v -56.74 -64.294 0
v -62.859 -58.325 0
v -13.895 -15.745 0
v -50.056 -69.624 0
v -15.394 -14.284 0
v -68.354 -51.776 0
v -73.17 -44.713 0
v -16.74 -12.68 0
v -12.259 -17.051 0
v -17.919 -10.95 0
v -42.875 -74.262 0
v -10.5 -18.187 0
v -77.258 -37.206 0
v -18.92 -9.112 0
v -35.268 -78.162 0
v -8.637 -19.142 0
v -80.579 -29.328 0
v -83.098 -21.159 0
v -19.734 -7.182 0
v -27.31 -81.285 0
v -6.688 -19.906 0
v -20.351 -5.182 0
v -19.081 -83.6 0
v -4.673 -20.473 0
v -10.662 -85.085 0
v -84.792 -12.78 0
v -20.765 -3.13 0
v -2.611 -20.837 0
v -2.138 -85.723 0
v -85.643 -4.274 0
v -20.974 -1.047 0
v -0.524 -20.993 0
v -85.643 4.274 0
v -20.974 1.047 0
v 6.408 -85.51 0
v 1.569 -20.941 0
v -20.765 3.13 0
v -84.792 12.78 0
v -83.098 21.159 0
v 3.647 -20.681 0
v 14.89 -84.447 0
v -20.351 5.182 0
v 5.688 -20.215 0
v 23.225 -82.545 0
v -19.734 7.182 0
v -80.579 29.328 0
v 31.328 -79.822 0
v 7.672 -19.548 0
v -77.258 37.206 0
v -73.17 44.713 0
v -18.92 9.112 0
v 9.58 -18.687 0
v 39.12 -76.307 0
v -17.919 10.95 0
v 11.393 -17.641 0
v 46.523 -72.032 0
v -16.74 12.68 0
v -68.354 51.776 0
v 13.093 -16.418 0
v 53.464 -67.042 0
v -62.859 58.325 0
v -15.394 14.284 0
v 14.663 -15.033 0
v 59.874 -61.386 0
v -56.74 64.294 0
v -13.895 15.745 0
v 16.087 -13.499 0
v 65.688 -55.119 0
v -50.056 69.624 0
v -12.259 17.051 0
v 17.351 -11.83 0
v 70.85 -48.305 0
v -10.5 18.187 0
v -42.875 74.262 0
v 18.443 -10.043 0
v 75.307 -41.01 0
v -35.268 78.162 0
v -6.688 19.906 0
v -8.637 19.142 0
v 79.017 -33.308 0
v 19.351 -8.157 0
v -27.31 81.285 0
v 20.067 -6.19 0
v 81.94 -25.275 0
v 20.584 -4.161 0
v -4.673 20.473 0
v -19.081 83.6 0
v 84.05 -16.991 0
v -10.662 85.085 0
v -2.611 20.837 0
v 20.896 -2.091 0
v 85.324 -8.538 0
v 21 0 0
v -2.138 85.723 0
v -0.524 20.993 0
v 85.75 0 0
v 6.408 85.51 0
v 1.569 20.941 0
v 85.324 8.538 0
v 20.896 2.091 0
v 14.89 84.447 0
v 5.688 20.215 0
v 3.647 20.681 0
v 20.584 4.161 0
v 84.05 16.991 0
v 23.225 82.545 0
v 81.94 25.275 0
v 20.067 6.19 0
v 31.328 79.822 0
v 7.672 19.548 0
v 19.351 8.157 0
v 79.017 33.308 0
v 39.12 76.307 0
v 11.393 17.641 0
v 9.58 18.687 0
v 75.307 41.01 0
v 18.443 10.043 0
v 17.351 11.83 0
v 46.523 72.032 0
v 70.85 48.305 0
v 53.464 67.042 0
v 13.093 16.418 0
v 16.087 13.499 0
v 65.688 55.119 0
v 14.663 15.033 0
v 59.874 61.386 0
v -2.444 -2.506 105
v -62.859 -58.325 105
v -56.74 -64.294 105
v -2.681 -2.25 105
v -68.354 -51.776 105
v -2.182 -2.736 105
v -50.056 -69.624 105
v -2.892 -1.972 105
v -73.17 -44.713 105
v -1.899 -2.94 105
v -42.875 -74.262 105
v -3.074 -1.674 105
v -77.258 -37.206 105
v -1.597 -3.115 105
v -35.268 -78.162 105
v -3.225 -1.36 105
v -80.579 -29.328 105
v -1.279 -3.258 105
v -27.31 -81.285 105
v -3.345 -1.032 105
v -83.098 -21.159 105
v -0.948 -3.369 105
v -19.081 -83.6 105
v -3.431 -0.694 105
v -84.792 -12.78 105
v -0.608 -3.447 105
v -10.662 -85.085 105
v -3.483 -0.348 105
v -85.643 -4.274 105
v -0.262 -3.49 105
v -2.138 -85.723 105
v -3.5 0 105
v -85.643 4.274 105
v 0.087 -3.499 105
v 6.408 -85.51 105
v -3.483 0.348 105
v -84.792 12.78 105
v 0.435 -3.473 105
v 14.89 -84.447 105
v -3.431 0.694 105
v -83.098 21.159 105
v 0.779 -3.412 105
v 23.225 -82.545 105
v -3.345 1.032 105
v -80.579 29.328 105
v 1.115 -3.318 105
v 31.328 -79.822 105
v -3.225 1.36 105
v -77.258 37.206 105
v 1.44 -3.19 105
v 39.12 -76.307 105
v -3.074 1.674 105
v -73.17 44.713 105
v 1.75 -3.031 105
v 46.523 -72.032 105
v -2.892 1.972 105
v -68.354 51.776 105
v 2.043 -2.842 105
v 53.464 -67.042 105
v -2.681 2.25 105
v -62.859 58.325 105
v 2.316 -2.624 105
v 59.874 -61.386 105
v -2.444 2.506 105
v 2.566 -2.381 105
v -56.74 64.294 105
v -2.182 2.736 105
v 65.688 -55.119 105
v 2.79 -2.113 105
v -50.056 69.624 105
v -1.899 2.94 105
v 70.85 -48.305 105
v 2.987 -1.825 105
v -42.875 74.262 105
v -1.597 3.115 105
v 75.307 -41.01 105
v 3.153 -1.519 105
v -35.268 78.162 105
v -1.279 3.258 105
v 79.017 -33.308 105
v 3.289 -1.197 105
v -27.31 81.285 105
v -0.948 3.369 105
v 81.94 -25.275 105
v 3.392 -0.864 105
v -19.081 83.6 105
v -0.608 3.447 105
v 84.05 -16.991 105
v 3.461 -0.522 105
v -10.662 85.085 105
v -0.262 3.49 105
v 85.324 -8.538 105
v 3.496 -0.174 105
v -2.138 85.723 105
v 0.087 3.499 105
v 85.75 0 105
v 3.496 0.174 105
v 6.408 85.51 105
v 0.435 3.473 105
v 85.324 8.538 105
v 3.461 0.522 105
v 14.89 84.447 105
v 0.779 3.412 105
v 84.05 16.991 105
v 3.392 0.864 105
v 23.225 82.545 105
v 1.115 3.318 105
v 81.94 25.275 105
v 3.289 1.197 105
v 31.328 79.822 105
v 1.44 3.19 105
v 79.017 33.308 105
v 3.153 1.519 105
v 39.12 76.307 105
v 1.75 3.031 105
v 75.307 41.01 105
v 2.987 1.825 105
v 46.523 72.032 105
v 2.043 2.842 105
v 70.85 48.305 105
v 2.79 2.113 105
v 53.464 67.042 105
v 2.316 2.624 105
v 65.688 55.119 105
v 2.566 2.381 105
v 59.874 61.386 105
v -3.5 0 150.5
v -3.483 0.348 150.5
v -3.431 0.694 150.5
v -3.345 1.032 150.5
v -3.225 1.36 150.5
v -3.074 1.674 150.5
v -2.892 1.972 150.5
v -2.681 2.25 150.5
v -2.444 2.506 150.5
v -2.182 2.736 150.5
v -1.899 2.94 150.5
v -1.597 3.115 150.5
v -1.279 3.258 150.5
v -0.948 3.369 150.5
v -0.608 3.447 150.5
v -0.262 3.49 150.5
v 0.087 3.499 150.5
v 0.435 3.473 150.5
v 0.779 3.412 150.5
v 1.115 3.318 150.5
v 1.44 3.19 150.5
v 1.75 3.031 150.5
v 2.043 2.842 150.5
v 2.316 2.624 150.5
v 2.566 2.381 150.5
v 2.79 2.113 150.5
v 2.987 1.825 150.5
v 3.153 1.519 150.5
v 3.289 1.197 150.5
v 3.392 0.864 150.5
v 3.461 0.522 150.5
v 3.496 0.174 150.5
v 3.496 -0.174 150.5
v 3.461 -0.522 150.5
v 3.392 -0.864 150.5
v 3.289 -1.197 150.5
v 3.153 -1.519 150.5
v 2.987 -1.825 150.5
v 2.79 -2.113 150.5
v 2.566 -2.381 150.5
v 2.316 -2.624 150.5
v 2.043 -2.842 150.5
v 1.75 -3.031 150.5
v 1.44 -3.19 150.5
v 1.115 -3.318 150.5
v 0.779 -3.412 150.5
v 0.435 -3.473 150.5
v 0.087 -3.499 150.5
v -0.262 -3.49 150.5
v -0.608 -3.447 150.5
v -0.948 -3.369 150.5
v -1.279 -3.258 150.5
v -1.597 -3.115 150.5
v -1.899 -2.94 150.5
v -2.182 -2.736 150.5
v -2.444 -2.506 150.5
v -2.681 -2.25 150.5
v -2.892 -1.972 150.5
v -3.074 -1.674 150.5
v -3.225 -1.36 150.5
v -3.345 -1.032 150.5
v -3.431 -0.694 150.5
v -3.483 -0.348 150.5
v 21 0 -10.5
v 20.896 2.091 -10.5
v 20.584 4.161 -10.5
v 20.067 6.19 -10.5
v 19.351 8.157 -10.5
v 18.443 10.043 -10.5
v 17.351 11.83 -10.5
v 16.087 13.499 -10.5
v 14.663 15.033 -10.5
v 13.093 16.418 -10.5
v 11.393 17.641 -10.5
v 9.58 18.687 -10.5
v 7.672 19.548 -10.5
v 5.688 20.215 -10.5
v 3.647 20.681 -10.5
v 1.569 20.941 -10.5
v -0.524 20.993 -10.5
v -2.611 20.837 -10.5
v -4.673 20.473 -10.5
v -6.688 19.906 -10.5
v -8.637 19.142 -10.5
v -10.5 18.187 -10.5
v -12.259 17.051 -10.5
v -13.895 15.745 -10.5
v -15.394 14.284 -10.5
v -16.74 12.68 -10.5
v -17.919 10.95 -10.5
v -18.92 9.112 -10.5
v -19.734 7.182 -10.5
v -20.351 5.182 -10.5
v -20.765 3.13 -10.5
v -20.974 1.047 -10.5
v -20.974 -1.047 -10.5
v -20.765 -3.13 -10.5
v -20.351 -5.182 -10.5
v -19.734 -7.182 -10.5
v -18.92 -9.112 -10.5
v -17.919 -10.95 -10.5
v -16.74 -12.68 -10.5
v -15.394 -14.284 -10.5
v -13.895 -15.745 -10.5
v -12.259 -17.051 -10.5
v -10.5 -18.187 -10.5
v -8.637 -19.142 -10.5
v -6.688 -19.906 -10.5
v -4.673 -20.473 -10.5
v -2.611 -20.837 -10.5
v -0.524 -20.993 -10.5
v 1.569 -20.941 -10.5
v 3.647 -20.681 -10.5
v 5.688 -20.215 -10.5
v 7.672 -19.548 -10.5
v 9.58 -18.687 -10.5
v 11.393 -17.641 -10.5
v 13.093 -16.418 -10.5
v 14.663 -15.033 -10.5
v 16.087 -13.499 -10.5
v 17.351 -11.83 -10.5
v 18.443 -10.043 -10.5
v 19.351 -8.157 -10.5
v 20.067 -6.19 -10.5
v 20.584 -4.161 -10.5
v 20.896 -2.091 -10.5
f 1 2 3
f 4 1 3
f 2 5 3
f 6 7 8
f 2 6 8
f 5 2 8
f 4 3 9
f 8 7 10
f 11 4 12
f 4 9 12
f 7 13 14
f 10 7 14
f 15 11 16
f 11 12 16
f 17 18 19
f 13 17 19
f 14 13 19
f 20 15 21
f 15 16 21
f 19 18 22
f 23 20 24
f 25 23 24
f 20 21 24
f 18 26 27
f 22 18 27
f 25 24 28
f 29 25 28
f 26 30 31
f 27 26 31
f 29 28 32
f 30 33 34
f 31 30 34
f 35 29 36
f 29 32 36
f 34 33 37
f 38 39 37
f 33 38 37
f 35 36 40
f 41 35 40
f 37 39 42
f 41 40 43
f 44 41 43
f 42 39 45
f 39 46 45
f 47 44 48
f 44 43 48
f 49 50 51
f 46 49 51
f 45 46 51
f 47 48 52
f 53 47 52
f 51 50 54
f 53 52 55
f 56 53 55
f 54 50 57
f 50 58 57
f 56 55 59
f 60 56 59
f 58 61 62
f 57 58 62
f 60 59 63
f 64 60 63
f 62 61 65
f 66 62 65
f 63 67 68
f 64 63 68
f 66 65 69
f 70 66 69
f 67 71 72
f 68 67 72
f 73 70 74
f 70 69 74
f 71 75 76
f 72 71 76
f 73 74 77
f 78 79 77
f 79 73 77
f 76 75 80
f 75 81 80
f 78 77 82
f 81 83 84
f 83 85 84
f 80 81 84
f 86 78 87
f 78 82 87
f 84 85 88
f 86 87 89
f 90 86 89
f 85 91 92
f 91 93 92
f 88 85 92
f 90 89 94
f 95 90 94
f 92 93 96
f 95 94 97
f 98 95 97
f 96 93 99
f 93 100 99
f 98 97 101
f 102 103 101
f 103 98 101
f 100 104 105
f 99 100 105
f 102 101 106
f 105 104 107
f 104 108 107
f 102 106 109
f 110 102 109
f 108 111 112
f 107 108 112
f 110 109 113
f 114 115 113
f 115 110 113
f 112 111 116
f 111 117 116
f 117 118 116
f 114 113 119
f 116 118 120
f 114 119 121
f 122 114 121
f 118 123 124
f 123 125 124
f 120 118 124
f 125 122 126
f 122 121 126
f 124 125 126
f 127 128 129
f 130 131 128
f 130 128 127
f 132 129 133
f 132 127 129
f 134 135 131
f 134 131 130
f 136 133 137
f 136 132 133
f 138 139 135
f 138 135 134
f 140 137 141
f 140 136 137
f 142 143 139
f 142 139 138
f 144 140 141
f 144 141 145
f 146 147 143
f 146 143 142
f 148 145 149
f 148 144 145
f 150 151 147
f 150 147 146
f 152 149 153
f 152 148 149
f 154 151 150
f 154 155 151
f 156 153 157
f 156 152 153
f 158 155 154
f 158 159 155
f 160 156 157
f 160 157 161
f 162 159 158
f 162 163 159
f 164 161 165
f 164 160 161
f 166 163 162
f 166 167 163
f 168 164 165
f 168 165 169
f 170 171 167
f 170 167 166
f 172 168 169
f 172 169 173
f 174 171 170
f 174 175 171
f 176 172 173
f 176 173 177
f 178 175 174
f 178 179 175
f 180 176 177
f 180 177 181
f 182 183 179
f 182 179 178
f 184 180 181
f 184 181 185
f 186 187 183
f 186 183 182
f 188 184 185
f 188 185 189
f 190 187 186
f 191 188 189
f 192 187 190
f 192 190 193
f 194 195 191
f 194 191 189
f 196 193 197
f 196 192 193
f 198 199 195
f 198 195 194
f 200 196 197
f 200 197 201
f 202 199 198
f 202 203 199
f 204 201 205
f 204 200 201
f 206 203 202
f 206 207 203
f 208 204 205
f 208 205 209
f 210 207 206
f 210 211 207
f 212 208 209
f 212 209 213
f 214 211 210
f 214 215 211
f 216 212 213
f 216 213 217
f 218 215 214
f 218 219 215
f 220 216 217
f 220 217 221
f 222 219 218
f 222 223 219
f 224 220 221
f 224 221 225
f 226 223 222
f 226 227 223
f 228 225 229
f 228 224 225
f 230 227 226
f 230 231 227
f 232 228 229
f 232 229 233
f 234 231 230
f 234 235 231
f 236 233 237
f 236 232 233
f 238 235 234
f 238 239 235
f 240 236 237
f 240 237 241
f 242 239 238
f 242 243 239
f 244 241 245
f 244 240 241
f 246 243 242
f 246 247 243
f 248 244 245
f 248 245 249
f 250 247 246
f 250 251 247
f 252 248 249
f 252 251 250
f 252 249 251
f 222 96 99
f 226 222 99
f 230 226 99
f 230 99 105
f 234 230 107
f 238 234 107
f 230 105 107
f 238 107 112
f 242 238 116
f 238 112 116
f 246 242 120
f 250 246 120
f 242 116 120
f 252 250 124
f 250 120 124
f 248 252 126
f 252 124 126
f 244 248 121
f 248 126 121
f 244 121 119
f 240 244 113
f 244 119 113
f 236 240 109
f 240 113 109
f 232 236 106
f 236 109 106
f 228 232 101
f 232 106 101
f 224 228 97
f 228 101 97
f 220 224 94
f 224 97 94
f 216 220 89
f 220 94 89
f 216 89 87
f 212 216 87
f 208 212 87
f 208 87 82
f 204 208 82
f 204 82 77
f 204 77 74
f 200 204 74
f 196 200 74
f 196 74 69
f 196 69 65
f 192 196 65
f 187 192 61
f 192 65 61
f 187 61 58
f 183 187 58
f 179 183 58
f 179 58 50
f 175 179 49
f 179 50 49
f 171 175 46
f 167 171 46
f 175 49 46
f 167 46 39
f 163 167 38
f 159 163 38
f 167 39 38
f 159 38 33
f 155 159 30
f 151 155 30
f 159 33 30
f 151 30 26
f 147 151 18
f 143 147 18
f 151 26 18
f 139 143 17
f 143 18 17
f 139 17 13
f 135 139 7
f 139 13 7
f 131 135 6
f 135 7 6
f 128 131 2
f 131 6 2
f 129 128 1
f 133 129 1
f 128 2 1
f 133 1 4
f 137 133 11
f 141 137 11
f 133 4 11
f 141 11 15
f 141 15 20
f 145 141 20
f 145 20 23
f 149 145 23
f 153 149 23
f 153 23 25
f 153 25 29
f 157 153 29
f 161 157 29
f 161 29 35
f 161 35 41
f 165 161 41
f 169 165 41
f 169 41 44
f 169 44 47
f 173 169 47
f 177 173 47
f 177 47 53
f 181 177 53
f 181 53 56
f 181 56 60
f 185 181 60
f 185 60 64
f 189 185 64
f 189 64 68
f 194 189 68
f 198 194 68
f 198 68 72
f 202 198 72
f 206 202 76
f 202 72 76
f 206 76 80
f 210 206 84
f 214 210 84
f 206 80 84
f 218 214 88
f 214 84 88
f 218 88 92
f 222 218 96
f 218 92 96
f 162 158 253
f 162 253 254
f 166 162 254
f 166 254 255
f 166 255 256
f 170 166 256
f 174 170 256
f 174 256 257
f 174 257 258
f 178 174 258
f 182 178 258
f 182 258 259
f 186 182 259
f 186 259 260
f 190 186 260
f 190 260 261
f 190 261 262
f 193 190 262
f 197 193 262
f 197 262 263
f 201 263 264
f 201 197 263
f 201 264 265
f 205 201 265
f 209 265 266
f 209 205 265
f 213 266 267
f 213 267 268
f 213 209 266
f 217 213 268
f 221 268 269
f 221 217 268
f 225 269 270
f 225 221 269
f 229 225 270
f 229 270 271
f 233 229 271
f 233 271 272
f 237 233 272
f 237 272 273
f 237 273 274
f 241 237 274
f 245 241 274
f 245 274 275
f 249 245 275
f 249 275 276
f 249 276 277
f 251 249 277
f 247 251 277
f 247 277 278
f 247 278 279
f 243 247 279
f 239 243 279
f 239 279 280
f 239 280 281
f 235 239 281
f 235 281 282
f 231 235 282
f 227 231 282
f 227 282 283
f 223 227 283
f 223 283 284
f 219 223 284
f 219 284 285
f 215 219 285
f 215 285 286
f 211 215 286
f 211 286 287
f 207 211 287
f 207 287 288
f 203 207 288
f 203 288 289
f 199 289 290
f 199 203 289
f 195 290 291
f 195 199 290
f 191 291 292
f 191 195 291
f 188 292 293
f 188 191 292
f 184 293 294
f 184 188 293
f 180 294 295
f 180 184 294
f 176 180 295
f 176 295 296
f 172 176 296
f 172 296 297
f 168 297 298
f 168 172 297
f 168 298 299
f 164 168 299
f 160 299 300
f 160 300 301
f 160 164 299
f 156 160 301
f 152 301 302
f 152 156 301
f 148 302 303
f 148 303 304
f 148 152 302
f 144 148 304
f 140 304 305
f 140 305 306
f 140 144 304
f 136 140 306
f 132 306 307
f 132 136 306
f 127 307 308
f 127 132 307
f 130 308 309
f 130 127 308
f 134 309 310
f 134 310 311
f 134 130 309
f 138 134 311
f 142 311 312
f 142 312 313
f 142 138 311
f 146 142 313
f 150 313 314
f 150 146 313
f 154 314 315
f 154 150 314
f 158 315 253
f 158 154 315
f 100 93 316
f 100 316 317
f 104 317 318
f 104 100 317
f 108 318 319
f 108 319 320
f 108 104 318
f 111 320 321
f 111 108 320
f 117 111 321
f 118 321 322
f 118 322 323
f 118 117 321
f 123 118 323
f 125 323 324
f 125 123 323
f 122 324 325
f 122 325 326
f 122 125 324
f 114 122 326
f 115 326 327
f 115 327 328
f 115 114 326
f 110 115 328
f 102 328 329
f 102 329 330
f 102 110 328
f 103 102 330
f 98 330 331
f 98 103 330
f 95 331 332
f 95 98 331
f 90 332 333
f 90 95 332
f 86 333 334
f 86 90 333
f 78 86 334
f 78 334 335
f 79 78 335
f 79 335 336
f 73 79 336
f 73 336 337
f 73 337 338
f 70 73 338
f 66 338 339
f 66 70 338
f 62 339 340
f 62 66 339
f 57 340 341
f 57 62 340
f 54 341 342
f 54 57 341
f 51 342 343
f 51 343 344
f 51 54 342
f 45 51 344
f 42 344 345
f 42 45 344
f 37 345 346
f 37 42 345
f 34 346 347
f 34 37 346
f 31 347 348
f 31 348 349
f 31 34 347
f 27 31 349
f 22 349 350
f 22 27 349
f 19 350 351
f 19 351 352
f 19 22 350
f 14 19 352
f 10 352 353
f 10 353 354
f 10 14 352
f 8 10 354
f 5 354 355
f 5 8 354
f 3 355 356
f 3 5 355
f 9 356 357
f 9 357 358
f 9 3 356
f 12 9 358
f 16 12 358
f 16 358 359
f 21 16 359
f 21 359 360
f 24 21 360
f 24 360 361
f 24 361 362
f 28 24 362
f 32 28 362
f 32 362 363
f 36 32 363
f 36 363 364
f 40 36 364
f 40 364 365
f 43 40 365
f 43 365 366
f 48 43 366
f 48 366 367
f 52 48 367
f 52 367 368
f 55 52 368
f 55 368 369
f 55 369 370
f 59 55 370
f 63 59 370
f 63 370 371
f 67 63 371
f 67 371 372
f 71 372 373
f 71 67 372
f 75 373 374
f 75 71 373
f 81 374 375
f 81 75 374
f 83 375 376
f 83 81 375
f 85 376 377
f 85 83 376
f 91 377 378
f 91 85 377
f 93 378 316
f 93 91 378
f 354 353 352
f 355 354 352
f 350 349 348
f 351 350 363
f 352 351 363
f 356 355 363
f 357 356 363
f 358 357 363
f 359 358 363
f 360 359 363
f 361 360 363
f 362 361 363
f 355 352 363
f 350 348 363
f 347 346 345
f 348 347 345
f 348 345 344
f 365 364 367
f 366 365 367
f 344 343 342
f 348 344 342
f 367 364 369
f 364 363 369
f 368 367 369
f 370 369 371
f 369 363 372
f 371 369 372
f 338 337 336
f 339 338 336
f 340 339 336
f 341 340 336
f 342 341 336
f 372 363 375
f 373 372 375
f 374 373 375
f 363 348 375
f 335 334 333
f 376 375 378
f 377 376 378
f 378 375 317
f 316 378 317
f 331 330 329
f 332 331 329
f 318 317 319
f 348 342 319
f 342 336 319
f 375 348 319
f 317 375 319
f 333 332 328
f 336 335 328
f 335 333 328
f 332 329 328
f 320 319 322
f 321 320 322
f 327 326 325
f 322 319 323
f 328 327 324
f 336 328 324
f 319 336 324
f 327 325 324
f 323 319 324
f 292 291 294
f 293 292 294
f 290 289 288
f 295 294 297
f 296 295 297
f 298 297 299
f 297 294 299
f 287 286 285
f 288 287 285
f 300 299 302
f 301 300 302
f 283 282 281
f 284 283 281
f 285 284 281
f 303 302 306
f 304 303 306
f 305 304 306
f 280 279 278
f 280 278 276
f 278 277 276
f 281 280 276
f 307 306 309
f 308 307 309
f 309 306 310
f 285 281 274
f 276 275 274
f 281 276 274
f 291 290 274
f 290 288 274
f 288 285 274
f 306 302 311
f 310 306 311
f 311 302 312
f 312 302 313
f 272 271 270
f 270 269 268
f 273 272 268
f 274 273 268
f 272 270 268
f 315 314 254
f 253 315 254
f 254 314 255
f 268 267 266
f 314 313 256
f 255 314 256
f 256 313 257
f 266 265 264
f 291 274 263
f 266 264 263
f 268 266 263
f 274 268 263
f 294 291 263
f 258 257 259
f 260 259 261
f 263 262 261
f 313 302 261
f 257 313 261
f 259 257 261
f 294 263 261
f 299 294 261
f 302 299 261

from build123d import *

# Parameters (mm, degrees)
CROQUIS1_R              = 85.75
SALIENTE_EXTRUIR1_DEPTH = 105
CROQUIS2_R              = 21
SALIENTE_EXTRUIR2_DEPTH = 10.5
CROQUIS3_R              = 3.5
SALIENTE_EXTRUIR4_DEPTH = 150.5


with BuildPart() as part:
    # Croquis1 → Saliente-Extruir1 (new body)
    with BuildSketch(Plane.XY):
        Circle(CROQUIS1_R)
    extrude(amount=SALIENTE_EXTRUIR1_DEPTH)

    # Croquis2 → Saliente-Extruir2 (add)
    with BuildSketch(Plane.XY):
        Circle(CROQUIS2_R)
    extrude(amount=-SALIENTE_EXTRUIR2_DEPTH)

    # Croquis3 → Saliente-Extruir4 (add)
    with BuildSketch(Plane(origin=(0, 0, 0), x_dir=(-1, 0, 0), z_dir=(0, 0, -1))):
        Circle(CROQUIS3_R)
    extrude(amount=-SALIENTE_EXTRUIR4_DEPTH)


solid = part.part
